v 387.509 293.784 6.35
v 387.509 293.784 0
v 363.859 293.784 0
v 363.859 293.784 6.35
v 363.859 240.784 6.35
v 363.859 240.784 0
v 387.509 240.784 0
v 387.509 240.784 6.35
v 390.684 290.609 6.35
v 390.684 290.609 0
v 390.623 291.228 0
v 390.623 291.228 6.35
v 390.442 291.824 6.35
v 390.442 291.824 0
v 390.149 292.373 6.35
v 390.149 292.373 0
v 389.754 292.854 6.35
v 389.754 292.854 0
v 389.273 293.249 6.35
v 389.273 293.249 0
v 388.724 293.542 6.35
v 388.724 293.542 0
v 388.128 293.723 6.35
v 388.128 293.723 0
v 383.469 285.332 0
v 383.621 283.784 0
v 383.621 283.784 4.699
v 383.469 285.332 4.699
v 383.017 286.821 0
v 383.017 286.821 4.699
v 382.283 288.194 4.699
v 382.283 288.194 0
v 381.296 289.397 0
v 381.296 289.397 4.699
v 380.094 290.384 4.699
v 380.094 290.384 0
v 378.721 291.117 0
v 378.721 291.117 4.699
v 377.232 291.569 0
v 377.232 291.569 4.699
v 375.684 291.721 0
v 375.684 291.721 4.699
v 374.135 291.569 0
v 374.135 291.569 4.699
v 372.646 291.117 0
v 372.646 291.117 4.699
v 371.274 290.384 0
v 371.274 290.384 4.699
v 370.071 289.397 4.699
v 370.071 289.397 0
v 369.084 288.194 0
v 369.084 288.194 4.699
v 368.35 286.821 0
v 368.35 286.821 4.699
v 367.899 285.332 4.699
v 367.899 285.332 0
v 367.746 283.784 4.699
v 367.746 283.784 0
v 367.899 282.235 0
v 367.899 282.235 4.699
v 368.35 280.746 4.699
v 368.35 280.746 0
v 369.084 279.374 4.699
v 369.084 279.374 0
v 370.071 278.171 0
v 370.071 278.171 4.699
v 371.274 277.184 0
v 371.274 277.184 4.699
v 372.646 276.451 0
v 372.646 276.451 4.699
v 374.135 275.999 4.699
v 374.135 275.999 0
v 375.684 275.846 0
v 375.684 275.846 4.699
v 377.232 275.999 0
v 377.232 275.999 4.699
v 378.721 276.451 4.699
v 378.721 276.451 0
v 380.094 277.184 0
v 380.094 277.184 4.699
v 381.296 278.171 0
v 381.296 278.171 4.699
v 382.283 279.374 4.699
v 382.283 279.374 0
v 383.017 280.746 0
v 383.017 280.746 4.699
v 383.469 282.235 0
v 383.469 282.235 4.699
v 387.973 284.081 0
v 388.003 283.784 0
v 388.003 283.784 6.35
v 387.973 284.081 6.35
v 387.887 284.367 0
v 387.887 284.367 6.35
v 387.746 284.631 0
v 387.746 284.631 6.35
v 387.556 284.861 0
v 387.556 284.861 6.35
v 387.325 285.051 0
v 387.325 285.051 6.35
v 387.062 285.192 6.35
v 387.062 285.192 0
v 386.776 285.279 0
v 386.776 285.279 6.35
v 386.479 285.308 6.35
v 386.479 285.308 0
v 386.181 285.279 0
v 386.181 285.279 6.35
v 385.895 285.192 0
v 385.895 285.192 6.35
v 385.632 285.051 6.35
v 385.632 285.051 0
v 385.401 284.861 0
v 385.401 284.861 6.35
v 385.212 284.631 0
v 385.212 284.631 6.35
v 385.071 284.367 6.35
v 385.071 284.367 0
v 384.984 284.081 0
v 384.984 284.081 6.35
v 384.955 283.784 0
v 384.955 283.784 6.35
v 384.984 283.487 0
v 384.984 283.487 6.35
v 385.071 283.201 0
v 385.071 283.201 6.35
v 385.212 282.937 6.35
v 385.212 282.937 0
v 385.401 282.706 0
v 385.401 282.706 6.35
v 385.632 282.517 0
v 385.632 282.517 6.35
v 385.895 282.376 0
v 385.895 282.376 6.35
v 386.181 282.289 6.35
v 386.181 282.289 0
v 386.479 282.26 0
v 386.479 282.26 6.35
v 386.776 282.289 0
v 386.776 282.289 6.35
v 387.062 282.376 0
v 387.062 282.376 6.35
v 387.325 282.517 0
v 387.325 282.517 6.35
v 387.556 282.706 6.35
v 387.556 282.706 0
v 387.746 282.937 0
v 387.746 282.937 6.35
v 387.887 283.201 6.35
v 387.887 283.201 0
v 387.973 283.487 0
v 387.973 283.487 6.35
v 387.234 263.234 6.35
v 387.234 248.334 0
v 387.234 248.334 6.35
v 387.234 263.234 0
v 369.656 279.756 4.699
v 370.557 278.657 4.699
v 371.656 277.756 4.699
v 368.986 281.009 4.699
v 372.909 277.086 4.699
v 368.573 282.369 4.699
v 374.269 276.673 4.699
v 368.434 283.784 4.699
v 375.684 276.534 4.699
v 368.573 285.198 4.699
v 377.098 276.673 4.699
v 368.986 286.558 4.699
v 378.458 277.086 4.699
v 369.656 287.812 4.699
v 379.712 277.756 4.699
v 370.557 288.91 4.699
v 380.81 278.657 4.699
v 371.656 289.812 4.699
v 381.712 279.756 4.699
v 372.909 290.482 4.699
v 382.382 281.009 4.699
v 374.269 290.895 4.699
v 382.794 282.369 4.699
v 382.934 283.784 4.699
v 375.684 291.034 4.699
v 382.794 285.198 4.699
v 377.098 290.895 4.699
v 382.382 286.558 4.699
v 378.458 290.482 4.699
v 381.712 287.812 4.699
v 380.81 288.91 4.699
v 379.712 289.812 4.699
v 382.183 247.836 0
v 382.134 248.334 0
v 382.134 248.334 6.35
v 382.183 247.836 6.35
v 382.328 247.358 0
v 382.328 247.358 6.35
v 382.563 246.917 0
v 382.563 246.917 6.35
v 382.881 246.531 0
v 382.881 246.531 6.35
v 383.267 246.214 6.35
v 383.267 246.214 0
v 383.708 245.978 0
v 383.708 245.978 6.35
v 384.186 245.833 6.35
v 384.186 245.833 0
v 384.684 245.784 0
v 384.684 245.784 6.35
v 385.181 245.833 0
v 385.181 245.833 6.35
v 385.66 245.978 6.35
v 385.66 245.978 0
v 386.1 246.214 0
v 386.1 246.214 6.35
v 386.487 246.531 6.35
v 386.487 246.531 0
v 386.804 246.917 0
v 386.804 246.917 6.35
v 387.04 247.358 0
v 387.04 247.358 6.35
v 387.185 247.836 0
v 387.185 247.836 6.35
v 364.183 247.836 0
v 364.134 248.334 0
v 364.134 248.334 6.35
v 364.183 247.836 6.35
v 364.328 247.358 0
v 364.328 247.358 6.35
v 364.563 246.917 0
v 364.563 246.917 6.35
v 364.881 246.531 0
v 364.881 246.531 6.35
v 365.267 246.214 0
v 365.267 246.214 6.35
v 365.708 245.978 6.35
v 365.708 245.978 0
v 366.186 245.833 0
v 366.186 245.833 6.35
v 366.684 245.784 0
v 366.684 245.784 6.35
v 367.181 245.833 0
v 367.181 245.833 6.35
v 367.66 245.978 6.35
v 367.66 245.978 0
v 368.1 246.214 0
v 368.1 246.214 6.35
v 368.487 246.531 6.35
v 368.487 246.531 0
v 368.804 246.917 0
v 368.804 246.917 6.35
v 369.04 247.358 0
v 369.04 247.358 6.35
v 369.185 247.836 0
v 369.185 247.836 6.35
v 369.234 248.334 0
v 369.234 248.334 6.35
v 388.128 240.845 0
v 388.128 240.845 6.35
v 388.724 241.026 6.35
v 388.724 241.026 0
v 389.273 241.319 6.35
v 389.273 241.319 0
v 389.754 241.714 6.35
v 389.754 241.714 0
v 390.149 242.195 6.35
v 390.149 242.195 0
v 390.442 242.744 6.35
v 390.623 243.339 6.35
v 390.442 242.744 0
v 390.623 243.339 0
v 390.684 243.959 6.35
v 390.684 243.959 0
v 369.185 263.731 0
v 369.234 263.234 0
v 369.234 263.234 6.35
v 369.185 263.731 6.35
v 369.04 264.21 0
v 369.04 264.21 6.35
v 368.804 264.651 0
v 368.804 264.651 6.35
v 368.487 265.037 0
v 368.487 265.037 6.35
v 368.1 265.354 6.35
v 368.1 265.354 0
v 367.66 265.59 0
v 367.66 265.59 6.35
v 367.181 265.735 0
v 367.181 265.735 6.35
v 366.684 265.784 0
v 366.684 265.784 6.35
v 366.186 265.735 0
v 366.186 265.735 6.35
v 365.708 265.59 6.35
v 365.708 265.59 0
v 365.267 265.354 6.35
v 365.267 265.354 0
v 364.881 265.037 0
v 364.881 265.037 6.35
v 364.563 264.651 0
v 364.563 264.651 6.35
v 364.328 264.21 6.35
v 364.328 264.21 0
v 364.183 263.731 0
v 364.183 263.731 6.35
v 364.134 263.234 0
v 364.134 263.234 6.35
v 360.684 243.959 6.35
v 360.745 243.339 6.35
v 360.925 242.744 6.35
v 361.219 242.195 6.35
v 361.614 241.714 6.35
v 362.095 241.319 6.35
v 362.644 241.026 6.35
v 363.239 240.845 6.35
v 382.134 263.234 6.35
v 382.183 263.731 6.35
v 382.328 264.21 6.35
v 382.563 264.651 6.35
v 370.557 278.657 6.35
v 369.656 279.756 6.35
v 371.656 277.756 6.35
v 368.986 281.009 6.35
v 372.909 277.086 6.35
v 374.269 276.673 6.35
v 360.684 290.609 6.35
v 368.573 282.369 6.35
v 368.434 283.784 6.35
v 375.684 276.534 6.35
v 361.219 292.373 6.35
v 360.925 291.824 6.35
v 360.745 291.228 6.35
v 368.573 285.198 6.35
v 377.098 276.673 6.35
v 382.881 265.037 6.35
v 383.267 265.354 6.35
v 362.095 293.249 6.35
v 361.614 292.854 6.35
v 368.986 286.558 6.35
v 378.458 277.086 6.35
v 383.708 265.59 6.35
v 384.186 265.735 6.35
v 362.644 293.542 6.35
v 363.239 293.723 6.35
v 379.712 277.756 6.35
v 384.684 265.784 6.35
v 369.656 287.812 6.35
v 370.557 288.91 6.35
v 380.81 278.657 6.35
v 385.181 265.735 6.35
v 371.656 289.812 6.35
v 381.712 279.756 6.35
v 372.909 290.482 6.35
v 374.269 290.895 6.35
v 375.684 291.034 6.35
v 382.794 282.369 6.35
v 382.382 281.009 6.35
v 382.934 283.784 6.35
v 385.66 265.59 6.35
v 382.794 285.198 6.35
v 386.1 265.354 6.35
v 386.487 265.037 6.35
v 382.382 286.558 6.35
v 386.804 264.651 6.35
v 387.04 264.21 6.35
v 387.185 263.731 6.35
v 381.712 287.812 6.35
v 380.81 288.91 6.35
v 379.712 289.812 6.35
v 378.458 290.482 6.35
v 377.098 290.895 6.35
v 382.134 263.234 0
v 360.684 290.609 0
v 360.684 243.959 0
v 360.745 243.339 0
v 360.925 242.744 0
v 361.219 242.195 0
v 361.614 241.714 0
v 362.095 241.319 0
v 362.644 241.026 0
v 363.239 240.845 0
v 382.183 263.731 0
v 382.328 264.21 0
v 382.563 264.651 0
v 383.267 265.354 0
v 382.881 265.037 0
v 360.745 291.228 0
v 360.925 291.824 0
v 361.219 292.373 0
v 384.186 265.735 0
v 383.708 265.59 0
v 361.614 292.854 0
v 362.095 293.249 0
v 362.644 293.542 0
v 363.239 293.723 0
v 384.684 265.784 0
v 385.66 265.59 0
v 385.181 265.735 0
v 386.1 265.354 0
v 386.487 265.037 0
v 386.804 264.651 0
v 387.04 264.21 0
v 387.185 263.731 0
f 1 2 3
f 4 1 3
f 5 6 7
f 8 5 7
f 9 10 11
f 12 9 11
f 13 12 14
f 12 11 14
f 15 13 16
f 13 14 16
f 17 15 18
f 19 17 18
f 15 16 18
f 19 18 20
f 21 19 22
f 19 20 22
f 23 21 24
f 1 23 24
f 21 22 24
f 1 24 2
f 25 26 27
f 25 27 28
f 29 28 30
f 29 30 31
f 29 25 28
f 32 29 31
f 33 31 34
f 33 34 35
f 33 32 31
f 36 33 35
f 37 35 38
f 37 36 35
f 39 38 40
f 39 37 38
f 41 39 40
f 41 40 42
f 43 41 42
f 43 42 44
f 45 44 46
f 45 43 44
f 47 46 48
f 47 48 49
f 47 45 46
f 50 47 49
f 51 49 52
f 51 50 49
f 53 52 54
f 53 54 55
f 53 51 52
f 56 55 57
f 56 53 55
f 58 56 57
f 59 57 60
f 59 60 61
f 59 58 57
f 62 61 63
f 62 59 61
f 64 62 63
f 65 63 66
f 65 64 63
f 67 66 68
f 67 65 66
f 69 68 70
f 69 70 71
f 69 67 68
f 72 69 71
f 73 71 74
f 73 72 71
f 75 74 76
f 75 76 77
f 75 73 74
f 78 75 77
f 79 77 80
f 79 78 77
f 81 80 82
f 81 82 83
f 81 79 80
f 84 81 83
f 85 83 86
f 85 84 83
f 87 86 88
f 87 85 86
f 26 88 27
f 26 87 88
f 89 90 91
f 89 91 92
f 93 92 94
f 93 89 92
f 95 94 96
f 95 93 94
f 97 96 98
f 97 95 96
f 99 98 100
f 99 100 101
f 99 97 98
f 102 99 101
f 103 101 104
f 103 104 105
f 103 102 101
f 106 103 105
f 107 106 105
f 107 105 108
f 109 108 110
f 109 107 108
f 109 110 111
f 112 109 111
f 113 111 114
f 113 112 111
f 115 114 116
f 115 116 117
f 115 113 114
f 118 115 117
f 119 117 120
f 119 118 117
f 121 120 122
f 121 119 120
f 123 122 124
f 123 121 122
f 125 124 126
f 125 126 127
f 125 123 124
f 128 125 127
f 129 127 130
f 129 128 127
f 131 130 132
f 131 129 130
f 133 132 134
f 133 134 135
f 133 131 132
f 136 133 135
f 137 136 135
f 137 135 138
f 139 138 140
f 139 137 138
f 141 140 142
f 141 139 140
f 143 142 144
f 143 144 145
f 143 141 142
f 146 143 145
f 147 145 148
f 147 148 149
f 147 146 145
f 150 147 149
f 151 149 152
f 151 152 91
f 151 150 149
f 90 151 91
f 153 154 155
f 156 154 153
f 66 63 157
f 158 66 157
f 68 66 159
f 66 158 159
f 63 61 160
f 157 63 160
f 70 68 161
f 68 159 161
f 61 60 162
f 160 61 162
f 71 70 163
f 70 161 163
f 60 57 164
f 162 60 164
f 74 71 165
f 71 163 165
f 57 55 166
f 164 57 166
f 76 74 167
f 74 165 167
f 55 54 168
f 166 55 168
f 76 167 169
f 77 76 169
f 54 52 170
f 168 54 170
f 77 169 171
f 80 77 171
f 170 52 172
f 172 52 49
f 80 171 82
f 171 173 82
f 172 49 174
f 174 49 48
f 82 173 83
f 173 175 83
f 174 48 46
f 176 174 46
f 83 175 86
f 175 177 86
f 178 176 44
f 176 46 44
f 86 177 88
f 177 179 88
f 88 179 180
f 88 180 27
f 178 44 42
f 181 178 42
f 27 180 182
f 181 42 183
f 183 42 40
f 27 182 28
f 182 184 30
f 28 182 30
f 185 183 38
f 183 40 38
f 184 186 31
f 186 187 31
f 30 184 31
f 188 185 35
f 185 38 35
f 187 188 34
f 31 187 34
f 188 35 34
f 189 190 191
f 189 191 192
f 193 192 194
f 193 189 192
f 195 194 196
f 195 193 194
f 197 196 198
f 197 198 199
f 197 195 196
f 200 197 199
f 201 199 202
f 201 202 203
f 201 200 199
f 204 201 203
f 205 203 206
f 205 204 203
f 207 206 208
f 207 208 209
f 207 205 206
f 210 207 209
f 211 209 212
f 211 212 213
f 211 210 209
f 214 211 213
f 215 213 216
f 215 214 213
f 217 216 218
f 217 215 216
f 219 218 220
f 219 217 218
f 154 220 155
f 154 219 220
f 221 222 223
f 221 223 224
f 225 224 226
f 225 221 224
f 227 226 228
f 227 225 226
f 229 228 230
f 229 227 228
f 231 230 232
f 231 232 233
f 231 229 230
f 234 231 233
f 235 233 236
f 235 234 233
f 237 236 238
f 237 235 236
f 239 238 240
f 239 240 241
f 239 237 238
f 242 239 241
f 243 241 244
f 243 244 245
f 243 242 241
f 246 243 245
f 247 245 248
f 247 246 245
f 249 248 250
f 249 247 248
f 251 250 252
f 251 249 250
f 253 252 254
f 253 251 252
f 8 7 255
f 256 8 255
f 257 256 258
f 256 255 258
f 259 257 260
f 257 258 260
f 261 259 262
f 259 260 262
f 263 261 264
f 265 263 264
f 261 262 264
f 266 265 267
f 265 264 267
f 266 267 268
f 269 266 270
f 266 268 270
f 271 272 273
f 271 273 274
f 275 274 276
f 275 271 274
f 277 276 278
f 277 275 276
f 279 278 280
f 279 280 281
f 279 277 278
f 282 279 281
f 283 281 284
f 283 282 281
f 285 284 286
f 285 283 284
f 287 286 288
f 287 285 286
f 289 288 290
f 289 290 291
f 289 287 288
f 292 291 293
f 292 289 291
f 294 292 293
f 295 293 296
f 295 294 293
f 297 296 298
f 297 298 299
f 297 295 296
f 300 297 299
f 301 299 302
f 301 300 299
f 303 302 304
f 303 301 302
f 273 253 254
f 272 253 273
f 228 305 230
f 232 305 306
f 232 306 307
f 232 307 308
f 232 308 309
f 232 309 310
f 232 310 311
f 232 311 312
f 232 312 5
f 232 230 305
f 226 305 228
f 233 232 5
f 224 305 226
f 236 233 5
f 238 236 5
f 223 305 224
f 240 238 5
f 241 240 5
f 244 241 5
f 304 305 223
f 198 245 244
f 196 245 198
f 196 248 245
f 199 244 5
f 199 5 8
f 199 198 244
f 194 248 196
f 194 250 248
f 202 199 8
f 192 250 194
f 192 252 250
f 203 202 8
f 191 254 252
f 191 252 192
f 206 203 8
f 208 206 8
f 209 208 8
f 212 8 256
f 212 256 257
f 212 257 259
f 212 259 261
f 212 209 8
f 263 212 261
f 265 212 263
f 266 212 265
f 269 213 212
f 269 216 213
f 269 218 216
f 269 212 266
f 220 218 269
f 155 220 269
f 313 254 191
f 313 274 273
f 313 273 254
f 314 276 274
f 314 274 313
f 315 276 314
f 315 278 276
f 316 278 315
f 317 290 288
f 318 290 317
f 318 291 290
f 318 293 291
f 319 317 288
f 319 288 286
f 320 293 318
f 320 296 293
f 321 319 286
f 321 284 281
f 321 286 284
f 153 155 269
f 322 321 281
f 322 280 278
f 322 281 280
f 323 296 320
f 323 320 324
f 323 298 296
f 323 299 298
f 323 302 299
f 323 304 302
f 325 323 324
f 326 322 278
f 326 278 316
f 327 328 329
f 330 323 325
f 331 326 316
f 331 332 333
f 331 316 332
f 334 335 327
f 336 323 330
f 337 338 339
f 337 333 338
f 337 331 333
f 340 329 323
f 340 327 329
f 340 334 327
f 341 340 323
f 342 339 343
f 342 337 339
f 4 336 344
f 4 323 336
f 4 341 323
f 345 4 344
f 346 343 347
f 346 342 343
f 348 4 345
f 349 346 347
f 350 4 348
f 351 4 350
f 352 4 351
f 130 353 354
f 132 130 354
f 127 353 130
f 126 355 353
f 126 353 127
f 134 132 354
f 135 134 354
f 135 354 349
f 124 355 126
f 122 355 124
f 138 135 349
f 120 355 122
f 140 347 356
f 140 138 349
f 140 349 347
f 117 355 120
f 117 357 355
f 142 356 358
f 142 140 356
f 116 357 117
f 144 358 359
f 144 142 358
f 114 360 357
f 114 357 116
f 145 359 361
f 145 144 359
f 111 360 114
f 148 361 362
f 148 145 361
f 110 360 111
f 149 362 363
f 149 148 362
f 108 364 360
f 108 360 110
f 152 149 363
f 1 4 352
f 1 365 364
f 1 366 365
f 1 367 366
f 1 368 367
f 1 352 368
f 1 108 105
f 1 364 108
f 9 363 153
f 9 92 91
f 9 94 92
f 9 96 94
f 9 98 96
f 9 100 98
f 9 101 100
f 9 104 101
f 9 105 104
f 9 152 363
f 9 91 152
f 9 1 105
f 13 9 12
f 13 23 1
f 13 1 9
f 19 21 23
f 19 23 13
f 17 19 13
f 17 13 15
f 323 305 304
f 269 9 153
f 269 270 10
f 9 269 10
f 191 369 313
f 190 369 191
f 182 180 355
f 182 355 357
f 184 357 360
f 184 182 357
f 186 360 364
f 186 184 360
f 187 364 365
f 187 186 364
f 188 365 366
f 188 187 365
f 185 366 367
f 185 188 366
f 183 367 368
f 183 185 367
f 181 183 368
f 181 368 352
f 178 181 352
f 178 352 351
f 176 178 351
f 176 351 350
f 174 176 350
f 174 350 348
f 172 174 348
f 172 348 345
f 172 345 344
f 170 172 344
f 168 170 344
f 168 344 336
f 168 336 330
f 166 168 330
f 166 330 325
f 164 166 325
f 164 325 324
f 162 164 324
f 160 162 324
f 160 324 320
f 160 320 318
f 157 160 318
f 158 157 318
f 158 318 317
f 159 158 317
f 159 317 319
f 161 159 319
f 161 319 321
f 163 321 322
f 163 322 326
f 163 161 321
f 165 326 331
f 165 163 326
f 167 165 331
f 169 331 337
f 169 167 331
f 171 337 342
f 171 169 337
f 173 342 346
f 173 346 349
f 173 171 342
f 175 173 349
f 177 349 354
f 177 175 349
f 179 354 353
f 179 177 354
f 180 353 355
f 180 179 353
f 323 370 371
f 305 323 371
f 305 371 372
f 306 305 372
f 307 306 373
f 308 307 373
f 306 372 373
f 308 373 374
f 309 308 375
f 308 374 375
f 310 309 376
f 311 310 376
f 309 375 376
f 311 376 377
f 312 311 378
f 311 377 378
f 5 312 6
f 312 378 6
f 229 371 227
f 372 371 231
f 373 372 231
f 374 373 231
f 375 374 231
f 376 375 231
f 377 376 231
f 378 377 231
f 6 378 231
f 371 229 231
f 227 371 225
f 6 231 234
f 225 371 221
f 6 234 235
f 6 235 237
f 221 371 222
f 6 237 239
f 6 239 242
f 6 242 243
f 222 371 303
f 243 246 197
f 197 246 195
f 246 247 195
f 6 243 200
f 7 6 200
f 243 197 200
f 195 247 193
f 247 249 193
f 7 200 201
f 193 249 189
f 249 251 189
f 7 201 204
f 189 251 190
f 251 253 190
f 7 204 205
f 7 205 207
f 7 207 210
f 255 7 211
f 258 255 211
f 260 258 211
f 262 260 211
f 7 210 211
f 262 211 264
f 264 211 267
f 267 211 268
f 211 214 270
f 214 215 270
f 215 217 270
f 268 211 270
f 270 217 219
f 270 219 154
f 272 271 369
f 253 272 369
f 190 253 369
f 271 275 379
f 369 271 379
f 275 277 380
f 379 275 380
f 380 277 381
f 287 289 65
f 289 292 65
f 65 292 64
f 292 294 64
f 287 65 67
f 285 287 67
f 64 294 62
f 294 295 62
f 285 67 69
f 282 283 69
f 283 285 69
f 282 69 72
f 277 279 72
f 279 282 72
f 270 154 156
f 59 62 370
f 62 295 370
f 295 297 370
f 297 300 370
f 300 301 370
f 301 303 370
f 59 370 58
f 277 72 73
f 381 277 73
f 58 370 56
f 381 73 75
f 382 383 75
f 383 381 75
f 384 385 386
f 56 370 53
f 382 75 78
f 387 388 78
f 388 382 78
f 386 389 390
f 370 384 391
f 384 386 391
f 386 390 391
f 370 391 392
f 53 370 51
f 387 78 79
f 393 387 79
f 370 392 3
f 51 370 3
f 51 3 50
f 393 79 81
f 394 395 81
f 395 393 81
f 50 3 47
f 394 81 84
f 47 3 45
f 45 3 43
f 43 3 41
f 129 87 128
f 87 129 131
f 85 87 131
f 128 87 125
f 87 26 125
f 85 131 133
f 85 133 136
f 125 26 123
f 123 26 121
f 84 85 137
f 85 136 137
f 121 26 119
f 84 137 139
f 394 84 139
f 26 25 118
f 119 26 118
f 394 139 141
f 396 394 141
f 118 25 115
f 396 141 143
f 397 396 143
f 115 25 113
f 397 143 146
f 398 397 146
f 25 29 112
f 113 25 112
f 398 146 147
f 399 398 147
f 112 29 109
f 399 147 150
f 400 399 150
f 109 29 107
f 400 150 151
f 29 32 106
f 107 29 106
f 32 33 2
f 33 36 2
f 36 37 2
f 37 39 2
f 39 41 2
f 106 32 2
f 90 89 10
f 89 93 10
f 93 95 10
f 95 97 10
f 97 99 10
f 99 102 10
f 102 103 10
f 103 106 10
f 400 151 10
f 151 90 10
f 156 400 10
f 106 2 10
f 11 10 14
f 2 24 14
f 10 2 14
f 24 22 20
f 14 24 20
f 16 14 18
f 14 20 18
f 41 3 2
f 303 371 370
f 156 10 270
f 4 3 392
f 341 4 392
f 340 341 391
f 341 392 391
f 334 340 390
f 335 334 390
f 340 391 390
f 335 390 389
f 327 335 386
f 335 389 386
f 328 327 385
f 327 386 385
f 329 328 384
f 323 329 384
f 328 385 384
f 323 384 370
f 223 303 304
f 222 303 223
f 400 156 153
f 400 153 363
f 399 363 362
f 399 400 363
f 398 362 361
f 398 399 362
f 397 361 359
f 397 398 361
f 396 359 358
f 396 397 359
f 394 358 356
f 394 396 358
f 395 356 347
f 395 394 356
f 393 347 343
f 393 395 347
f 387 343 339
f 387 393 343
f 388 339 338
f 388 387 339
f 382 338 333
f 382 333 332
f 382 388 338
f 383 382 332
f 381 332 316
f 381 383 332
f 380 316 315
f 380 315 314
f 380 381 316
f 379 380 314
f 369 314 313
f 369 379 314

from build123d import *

# Parameters (mm, degrees)
SKETCH1_R           = 1.524
SKETCH1_R_2         = 7.250000001
BOSS_EXTRUDE1_DEPTH = 6.35
SKETCH1_3_R         = 7.9375
SKETCH1_3_R_2       = 7.250000001
CUT_EXTRUDE1_DEPTH  = 4.699


with BuildPart() as part:
    # Sketch1 → Boss-Extrude1 (new body)
    with BuildSketch(Plane.XY):
        with BuildLine():
            ThreePointArc((360.683701588, 243.958854223), (361.613637557, 241.713790192), (363.858701588, 240.783854223))
            Line((363.858701588, 240.783854223), (387.508701588, 240.783854223))
            ThreePointArc((387.508701588, 240.783854223), (389.753765618, 241.713790192), (390.683701588, 243.958854223))
            Line((390.683701588, 243.958854223), (390.683701588, 290.608854224))
            ThreePointArc((390.683701588, 290.608854224), (389.753765618, 292.853918255), (387.508701588, 293.783854224))
            Line((387.508701588, 293.783854224), (363.858701588, 293.783854224))
            ThreePointArc((363.858701588, 293.783854224), (361.613637557, 292.853918255), (360.683701588, 290.608854224))
            Line((360.683701588, 290.608854224), (360.683701588, 243.958854223))
        make_face()
        with BuildLine():
            ThreePointArc((369.233701587, 248.333854223), (366.683701588, 245.783854224), (364.133701589, 248.333854223))
            Line((364.133701589, 248.333854223), (364.133701589, 263.233854225))
            ThreePointArc((364.133701589, 263.233854225), (366.683701588, 265.783854224), (369.233701587, 263.233854225))
            Line((369.233701587, 263.233854225), (369.233701587, 248.333854223))
        make_face(mode=Mode.SUBTRACT)
        with BuildLine():
            Line((382.133701588, 248.333854223), (382.133701588, 263.233854225))
            ThreePointArc((382.133701588, 263.233854225), (384.683701589, 265.783854225), (387.233701589, 263.233854225))
            Line((387.233701589, 263.233854225), (387.233701589, 248.333854223))
            ThreePointArc((387.233701589, 248.333854223), (384.683701589, 245.783854223), (382.133701588, 248.333854223))
        make_face(mode=Mode.SUBTRACT)
        with Locations((386.478701588, 283.783854224)):
            Circle(SKETCH1_R, mode=Mode.SUBTRACT)
        with Locations((375.683701588, 283.783854224)):
            Circle(SKETCH1_R_2, mode=Mode.SUBTRACT)
    extrude(amount=BOSS_EXTRUDE1_DEPTH)

    # Sketch1<3> → Cut-Extrude1 (cut)
    with BuildSketch(Plane.XY):
        with Locations((375.683701588, 283.783854224)):
            Circle(SKETCH1_3_R)
        with Locations((375.683701588, 283.783854224)):
            Circle(SKETCH1_3_R_2, mode=Mode.SUBTRACT)
    extrude(amount=CUT_EXTRUDE1_DEPTH, mode=Mode.SUBTRACT)


solid = part.part
